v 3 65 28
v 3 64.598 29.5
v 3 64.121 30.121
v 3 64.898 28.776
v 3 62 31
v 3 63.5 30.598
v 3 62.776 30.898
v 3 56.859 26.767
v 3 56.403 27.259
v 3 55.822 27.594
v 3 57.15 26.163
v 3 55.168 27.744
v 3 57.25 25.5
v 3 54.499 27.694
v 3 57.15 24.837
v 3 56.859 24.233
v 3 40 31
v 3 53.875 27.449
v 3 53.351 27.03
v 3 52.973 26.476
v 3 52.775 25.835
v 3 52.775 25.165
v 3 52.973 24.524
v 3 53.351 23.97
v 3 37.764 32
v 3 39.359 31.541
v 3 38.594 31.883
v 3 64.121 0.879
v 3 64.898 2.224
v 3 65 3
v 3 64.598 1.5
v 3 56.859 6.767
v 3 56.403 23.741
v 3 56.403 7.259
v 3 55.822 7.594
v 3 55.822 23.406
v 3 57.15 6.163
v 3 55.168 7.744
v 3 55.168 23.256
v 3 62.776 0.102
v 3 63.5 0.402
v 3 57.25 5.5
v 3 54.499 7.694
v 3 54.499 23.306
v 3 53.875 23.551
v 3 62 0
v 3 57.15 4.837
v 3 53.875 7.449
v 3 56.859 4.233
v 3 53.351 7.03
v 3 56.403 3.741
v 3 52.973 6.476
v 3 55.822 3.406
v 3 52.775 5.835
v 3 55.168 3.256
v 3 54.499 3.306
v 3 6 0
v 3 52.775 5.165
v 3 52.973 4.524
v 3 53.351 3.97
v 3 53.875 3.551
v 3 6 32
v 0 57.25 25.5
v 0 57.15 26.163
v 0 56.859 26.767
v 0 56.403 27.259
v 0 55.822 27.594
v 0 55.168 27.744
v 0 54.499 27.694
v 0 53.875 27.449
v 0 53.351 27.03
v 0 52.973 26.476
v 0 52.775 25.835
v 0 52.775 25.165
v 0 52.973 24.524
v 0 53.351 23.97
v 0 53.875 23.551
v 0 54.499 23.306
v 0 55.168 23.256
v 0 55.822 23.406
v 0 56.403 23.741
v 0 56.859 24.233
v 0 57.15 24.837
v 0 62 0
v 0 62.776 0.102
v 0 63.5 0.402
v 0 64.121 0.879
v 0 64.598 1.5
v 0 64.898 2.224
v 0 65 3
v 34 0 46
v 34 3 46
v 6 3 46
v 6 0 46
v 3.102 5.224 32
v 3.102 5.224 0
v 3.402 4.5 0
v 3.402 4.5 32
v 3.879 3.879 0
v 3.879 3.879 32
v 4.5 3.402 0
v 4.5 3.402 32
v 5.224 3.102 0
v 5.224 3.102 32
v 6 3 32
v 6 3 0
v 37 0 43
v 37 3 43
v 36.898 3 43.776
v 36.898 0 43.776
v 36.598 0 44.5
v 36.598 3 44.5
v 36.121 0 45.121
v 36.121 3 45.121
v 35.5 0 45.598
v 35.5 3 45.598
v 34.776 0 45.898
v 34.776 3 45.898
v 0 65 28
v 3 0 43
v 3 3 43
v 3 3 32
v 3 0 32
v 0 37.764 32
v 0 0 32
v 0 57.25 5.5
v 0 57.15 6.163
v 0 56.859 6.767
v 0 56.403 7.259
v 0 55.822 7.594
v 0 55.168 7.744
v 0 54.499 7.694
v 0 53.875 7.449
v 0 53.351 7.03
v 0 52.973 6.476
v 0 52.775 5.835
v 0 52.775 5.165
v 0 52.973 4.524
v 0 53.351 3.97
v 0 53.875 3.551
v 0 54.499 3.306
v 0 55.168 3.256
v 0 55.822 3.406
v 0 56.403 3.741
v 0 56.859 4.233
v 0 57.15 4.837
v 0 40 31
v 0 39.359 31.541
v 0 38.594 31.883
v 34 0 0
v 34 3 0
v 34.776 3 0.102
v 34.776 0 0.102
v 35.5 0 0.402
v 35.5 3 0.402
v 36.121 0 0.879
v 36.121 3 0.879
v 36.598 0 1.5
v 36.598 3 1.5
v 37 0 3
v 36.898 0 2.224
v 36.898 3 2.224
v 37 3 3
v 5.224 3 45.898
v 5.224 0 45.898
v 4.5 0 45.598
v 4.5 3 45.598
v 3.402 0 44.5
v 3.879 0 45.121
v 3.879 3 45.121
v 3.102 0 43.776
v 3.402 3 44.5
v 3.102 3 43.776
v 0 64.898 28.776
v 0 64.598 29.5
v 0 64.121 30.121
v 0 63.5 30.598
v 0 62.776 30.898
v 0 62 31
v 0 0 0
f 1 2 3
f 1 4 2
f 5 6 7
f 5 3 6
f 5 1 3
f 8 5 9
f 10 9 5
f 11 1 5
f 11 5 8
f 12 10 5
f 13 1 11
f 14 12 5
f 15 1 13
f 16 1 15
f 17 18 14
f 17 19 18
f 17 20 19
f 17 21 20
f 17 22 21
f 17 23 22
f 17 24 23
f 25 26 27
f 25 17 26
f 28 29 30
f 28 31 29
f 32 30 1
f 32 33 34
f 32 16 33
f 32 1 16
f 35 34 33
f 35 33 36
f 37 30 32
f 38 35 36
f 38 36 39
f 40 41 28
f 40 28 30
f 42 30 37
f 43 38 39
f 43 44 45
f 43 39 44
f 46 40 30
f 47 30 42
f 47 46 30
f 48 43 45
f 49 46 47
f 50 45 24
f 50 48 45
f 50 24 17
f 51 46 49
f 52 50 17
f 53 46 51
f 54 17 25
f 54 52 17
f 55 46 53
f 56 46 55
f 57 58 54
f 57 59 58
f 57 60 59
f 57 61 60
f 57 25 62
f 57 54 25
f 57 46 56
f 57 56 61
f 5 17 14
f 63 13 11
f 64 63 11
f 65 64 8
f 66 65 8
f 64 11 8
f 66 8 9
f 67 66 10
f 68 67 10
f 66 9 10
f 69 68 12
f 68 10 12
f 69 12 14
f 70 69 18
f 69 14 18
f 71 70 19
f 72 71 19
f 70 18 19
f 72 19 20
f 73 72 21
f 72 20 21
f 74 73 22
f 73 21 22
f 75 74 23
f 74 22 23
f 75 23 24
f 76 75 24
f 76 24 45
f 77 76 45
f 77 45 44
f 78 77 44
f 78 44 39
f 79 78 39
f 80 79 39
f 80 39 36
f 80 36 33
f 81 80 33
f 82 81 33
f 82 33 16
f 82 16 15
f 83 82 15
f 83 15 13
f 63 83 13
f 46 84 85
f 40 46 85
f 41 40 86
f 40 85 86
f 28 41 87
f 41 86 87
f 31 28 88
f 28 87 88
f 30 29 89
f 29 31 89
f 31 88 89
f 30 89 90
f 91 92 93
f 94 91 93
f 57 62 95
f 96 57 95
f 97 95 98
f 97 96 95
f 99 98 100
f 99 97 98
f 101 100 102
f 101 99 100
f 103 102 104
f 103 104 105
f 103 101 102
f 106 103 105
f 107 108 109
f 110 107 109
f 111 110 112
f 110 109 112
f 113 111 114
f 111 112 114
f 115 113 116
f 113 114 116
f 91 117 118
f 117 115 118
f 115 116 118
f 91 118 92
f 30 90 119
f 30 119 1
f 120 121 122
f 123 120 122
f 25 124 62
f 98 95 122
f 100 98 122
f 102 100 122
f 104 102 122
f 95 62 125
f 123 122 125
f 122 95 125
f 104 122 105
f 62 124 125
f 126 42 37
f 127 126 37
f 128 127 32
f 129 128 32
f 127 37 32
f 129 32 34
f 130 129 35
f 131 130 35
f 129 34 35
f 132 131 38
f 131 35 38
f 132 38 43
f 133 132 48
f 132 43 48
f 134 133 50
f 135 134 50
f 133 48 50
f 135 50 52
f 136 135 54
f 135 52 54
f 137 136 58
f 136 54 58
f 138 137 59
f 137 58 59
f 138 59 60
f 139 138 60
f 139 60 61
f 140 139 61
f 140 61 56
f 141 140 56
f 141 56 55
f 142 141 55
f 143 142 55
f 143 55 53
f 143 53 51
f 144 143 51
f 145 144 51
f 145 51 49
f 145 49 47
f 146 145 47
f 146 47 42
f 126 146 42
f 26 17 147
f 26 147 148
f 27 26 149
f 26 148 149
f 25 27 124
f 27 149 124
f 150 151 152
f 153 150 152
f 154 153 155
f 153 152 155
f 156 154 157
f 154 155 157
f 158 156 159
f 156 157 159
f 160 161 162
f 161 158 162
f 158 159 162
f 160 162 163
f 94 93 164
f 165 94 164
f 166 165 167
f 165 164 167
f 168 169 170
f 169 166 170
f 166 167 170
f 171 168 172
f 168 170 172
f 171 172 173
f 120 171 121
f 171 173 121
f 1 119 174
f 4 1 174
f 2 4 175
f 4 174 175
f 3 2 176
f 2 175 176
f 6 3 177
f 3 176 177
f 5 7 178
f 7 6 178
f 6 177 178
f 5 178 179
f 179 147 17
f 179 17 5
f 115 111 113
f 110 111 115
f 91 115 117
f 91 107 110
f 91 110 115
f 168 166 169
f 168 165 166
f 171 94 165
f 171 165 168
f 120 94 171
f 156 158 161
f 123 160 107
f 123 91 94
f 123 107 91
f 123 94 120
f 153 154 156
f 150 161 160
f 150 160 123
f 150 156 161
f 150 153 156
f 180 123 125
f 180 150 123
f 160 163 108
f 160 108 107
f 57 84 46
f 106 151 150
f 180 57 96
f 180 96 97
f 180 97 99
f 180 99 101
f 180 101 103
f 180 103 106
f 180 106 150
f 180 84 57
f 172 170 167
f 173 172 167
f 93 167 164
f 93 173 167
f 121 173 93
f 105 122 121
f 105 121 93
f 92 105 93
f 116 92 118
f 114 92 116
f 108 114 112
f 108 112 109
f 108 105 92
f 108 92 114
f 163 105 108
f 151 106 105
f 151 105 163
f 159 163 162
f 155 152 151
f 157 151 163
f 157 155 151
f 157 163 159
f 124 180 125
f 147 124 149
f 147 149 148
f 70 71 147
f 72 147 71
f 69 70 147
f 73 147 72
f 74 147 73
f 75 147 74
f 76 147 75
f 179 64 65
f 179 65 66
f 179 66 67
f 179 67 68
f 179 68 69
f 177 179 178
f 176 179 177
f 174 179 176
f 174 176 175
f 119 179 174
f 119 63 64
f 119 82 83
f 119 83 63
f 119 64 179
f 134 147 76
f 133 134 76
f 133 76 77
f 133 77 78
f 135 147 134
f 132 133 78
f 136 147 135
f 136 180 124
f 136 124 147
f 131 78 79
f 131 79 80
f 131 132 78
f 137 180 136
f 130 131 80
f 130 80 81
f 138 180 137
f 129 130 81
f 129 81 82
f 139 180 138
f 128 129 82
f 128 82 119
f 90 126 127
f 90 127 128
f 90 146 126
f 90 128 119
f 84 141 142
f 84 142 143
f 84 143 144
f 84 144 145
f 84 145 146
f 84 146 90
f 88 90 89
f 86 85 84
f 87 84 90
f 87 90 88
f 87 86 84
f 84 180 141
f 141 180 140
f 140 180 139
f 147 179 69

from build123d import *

# Parameters (mm, degrees)
BOSS_EXTRUDE1_DEPTH = 46
CUT_EXTRUDE1_DEPTH  = 3
SKETCH3_R           = 2.25
CUT_EXTRUDE2_DEPTH  = 46
FILLET1_R           = 3


with BuildPart() as part:
    # Sketch1 → Boss-Extrude1 (new body)
    with BuildSketch(Plane.XY):
        Polygon((0, 0), (0, 65), (3, 65), (3, 3), (37, 3), (37, 0), align=None)
    extrude(amount=BOSS_EXTRUDE1_DEPTH)

    # Sketch2 → Cut-Extrude1 (cut)
    with BuildSketch(Plane.ZY):
        Polygon((32, 65), (46, 65), (46, 0), (32, 0), (32, 40), (31, 40), (31, 65), align=None)
    extrude(amount=-CUT_EXTRUDE1_DEPTH, mode=Mode.SUBTRACT)

    # Sketch3 → Cut-Extrude2 (cut)
    with BuildSketch(Plane(origin=(3, 0, 0), x_dir=(0, 0, -1), z_dir=(1, 0, 0))):
        with Locations(Location((-25.5, 55, 0), (0, 0, 90))):
            Circle(SKETCH3_R)
        with Locations(Location((-5.5, 55, 0), (0, 0, 90))):
            Circle(SKETCH3_R)
    extrude(amount=-CUT_EXTRUDE2_DEPTH, mode=Mode.SUBTRACT)

    # Fillet1
    # the kernel refuses this fillet: 3 mm, written as the material it adds along each edge
    with BuildSketch(Plane(origin=(3, 3, 0), x_dir=(0, 1, 0), z_dir=(0, 0, 1))) as fillet1_piece_1:
        with BuildLine():
            CenterArc((FILLET1_R, -FILLET1_R), FILLET1_R, 90, 90)
            Line((0, -FILLET1_R), (0, 0))
            Line((0, 0), (FILLET1_R, 0))
        make_face()
    extrude(amount=32)
    # the kernel refuses this fillet: 3 mm, written as the material it takes off along each edge
    with BuildSketch(Plane(origin=(37, 10.5, 46), x_dir=(0, 0, -1), z_dir=(0, -1, 0)), Plane(origin=(37, 10.5, 0), x_dir=(-1, 0, 0), z_dir=(0, -1, 0)), Plane(origin=(-7.5, 65, 0), x_dir=(0, -1, 0), z_dir=(1, 0, 0)), Plane(origin=(-7.5, 65, 31), x_dir=(0, 0, -1), z_dir=(1, 0, 0))) as fillet1_2_piece_1:
        with BuildLine():
            CenterArc((FILLET1_R, -FILLET1_R), FILLET1_R, 90, 90)
            Line((0, -FILLET1_R), (0, 0))
            Line((0, 0), (FILLET1_R, 0))
        make_face()
    extrude(amount=18, mode=Mode.SUBTRACT)
    with BuildSketch(Plane(origin=(3, 10.5, 46), x_dir=(0, 0, -1), z_dir=(0, -1, 0))) as fillet1_2_piece_2:
        with BuildLine():
            CenterArc((FILLET1_R, FILLET1_R), FILLET1_R, 180, 90)
            Line((0, FILLET1_R), (0, 0))
            Line((0, 0), (FILLET1_R, 0))
        make_face()
    extrude(amount=18, mode=Mode.SUBTRACT)
    with BuildSketch(Plane(origin=(-5.590169944, 40, 32), x_dir=(0, -1, 0), z_dir=(1, 0, 0))) as fillet1_2_piece_3:
        with BuildLine():
            CenterArc((2.236067977, 3), FILLET1_R, 221.810314896, 48.189685104)
            Line((0, 1), (0, 0))
            Line((0, 0), (2.236067977, 0))
        make_face()
    extrude(amount=14.180339887, mode=Mode.SUBTRACT)


solid = part.part
